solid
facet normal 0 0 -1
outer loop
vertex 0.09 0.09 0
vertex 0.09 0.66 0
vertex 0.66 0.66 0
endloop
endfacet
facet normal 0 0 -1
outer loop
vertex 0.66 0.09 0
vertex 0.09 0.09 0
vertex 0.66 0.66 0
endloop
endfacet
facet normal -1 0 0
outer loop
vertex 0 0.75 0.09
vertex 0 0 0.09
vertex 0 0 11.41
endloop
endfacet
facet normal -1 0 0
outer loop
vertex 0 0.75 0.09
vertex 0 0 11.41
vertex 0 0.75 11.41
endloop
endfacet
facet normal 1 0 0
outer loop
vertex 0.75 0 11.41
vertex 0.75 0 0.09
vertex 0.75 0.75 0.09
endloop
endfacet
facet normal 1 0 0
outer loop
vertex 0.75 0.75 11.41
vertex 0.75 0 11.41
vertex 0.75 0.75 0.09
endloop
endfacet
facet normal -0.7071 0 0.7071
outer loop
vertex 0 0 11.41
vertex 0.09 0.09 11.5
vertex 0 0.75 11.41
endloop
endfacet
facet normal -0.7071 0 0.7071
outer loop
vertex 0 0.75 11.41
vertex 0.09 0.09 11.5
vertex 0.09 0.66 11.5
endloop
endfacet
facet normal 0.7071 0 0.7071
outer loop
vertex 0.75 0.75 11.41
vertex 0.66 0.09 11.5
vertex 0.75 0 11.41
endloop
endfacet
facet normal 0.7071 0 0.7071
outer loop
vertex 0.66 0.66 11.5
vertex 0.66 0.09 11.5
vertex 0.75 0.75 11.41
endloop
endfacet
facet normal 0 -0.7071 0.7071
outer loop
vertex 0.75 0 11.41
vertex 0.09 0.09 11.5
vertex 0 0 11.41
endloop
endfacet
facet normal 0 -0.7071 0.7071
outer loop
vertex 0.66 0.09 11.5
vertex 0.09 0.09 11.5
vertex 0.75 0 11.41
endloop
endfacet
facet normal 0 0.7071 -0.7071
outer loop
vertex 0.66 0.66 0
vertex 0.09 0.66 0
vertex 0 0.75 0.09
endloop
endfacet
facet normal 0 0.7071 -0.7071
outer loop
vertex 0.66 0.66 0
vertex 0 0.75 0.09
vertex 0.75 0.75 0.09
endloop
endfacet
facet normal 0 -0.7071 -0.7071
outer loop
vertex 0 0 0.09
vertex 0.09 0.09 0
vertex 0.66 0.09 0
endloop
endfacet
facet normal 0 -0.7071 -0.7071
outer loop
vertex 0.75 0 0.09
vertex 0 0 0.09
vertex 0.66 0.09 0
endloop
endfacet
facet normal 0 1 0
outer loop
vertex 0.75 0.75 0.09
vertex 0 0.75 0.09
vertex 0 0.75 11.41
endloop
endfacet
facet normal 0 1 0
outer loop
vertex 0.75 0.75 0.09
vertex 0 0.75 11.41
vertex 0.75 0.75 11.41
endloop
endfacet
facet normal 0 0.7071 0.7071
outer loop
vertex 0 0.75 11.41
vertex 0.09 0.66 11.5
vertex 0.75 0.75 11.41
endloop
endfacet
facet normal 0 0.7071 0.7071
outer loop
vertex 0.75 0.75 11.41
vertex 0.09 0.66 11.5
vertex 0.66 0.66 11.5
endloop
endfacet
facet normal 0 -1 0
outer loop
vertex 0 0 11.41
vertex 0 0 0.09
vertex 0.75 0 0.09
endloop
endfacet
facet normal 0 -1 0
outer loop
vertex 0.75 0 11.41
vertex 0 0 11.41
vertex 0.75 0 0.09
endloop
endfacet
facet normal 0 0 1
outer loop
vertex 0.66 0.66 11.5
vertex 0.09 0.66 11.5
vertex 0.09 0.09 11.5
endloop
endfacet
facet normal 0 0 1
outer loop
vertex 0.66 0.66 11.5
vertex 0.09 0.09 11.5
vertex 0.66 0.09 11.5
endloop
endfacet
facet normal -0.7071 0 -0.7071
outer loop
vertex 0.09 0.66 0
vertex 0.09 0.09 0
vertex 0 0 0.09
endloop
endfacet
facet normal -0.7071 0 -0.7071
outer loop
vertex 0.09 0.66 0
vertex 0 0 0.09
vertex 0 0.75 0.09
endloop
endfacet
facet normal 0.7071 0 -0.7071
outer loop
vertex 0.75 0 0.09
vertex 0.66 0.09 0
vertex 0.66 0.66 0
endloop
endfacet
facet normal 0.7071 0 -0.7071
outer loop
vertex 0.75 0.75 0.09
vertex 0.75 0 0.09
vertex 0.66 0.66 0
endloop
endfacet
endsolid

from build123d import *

# Parameters (mm, degrees)
SKETCH1_W           = 0.75
SKETCH1_H           = 0.75
BOSS_EXTRUDE1_DEPTH = 11.5
CHAMFER1_SIZE       = 0.09


with BuildPart() as part:
    # Sketch1 → Boss-Extrude1 (new body)
    with BuildSketch(Plane.XY):
        with Locations((0.375, 0.375)):
            Rectangle(SKETCH1_W, SKETCH1_H)
    extrude(amount=BOSS_EXTRUDE1_DEPTH)

    # Chamfer1
    chamfer1_edges = [part.edges().sort_by_distance(p)[0] for p in [
        (0.75, 0.375, 11.5),
        (0.375, 0.75, 11.5),
        (0, 0.375, 11.5),
        (0.375, 0.75, 0),
        (0.75, 0.375, 0),
        (0.375, 0, 0),
        (0, 0.375, 0),
        (0.375, 0, 11.5),
    ]]
    chamfer(chamfer1_edges, length=CHAMFER1_SIZE)


solid = part.part
